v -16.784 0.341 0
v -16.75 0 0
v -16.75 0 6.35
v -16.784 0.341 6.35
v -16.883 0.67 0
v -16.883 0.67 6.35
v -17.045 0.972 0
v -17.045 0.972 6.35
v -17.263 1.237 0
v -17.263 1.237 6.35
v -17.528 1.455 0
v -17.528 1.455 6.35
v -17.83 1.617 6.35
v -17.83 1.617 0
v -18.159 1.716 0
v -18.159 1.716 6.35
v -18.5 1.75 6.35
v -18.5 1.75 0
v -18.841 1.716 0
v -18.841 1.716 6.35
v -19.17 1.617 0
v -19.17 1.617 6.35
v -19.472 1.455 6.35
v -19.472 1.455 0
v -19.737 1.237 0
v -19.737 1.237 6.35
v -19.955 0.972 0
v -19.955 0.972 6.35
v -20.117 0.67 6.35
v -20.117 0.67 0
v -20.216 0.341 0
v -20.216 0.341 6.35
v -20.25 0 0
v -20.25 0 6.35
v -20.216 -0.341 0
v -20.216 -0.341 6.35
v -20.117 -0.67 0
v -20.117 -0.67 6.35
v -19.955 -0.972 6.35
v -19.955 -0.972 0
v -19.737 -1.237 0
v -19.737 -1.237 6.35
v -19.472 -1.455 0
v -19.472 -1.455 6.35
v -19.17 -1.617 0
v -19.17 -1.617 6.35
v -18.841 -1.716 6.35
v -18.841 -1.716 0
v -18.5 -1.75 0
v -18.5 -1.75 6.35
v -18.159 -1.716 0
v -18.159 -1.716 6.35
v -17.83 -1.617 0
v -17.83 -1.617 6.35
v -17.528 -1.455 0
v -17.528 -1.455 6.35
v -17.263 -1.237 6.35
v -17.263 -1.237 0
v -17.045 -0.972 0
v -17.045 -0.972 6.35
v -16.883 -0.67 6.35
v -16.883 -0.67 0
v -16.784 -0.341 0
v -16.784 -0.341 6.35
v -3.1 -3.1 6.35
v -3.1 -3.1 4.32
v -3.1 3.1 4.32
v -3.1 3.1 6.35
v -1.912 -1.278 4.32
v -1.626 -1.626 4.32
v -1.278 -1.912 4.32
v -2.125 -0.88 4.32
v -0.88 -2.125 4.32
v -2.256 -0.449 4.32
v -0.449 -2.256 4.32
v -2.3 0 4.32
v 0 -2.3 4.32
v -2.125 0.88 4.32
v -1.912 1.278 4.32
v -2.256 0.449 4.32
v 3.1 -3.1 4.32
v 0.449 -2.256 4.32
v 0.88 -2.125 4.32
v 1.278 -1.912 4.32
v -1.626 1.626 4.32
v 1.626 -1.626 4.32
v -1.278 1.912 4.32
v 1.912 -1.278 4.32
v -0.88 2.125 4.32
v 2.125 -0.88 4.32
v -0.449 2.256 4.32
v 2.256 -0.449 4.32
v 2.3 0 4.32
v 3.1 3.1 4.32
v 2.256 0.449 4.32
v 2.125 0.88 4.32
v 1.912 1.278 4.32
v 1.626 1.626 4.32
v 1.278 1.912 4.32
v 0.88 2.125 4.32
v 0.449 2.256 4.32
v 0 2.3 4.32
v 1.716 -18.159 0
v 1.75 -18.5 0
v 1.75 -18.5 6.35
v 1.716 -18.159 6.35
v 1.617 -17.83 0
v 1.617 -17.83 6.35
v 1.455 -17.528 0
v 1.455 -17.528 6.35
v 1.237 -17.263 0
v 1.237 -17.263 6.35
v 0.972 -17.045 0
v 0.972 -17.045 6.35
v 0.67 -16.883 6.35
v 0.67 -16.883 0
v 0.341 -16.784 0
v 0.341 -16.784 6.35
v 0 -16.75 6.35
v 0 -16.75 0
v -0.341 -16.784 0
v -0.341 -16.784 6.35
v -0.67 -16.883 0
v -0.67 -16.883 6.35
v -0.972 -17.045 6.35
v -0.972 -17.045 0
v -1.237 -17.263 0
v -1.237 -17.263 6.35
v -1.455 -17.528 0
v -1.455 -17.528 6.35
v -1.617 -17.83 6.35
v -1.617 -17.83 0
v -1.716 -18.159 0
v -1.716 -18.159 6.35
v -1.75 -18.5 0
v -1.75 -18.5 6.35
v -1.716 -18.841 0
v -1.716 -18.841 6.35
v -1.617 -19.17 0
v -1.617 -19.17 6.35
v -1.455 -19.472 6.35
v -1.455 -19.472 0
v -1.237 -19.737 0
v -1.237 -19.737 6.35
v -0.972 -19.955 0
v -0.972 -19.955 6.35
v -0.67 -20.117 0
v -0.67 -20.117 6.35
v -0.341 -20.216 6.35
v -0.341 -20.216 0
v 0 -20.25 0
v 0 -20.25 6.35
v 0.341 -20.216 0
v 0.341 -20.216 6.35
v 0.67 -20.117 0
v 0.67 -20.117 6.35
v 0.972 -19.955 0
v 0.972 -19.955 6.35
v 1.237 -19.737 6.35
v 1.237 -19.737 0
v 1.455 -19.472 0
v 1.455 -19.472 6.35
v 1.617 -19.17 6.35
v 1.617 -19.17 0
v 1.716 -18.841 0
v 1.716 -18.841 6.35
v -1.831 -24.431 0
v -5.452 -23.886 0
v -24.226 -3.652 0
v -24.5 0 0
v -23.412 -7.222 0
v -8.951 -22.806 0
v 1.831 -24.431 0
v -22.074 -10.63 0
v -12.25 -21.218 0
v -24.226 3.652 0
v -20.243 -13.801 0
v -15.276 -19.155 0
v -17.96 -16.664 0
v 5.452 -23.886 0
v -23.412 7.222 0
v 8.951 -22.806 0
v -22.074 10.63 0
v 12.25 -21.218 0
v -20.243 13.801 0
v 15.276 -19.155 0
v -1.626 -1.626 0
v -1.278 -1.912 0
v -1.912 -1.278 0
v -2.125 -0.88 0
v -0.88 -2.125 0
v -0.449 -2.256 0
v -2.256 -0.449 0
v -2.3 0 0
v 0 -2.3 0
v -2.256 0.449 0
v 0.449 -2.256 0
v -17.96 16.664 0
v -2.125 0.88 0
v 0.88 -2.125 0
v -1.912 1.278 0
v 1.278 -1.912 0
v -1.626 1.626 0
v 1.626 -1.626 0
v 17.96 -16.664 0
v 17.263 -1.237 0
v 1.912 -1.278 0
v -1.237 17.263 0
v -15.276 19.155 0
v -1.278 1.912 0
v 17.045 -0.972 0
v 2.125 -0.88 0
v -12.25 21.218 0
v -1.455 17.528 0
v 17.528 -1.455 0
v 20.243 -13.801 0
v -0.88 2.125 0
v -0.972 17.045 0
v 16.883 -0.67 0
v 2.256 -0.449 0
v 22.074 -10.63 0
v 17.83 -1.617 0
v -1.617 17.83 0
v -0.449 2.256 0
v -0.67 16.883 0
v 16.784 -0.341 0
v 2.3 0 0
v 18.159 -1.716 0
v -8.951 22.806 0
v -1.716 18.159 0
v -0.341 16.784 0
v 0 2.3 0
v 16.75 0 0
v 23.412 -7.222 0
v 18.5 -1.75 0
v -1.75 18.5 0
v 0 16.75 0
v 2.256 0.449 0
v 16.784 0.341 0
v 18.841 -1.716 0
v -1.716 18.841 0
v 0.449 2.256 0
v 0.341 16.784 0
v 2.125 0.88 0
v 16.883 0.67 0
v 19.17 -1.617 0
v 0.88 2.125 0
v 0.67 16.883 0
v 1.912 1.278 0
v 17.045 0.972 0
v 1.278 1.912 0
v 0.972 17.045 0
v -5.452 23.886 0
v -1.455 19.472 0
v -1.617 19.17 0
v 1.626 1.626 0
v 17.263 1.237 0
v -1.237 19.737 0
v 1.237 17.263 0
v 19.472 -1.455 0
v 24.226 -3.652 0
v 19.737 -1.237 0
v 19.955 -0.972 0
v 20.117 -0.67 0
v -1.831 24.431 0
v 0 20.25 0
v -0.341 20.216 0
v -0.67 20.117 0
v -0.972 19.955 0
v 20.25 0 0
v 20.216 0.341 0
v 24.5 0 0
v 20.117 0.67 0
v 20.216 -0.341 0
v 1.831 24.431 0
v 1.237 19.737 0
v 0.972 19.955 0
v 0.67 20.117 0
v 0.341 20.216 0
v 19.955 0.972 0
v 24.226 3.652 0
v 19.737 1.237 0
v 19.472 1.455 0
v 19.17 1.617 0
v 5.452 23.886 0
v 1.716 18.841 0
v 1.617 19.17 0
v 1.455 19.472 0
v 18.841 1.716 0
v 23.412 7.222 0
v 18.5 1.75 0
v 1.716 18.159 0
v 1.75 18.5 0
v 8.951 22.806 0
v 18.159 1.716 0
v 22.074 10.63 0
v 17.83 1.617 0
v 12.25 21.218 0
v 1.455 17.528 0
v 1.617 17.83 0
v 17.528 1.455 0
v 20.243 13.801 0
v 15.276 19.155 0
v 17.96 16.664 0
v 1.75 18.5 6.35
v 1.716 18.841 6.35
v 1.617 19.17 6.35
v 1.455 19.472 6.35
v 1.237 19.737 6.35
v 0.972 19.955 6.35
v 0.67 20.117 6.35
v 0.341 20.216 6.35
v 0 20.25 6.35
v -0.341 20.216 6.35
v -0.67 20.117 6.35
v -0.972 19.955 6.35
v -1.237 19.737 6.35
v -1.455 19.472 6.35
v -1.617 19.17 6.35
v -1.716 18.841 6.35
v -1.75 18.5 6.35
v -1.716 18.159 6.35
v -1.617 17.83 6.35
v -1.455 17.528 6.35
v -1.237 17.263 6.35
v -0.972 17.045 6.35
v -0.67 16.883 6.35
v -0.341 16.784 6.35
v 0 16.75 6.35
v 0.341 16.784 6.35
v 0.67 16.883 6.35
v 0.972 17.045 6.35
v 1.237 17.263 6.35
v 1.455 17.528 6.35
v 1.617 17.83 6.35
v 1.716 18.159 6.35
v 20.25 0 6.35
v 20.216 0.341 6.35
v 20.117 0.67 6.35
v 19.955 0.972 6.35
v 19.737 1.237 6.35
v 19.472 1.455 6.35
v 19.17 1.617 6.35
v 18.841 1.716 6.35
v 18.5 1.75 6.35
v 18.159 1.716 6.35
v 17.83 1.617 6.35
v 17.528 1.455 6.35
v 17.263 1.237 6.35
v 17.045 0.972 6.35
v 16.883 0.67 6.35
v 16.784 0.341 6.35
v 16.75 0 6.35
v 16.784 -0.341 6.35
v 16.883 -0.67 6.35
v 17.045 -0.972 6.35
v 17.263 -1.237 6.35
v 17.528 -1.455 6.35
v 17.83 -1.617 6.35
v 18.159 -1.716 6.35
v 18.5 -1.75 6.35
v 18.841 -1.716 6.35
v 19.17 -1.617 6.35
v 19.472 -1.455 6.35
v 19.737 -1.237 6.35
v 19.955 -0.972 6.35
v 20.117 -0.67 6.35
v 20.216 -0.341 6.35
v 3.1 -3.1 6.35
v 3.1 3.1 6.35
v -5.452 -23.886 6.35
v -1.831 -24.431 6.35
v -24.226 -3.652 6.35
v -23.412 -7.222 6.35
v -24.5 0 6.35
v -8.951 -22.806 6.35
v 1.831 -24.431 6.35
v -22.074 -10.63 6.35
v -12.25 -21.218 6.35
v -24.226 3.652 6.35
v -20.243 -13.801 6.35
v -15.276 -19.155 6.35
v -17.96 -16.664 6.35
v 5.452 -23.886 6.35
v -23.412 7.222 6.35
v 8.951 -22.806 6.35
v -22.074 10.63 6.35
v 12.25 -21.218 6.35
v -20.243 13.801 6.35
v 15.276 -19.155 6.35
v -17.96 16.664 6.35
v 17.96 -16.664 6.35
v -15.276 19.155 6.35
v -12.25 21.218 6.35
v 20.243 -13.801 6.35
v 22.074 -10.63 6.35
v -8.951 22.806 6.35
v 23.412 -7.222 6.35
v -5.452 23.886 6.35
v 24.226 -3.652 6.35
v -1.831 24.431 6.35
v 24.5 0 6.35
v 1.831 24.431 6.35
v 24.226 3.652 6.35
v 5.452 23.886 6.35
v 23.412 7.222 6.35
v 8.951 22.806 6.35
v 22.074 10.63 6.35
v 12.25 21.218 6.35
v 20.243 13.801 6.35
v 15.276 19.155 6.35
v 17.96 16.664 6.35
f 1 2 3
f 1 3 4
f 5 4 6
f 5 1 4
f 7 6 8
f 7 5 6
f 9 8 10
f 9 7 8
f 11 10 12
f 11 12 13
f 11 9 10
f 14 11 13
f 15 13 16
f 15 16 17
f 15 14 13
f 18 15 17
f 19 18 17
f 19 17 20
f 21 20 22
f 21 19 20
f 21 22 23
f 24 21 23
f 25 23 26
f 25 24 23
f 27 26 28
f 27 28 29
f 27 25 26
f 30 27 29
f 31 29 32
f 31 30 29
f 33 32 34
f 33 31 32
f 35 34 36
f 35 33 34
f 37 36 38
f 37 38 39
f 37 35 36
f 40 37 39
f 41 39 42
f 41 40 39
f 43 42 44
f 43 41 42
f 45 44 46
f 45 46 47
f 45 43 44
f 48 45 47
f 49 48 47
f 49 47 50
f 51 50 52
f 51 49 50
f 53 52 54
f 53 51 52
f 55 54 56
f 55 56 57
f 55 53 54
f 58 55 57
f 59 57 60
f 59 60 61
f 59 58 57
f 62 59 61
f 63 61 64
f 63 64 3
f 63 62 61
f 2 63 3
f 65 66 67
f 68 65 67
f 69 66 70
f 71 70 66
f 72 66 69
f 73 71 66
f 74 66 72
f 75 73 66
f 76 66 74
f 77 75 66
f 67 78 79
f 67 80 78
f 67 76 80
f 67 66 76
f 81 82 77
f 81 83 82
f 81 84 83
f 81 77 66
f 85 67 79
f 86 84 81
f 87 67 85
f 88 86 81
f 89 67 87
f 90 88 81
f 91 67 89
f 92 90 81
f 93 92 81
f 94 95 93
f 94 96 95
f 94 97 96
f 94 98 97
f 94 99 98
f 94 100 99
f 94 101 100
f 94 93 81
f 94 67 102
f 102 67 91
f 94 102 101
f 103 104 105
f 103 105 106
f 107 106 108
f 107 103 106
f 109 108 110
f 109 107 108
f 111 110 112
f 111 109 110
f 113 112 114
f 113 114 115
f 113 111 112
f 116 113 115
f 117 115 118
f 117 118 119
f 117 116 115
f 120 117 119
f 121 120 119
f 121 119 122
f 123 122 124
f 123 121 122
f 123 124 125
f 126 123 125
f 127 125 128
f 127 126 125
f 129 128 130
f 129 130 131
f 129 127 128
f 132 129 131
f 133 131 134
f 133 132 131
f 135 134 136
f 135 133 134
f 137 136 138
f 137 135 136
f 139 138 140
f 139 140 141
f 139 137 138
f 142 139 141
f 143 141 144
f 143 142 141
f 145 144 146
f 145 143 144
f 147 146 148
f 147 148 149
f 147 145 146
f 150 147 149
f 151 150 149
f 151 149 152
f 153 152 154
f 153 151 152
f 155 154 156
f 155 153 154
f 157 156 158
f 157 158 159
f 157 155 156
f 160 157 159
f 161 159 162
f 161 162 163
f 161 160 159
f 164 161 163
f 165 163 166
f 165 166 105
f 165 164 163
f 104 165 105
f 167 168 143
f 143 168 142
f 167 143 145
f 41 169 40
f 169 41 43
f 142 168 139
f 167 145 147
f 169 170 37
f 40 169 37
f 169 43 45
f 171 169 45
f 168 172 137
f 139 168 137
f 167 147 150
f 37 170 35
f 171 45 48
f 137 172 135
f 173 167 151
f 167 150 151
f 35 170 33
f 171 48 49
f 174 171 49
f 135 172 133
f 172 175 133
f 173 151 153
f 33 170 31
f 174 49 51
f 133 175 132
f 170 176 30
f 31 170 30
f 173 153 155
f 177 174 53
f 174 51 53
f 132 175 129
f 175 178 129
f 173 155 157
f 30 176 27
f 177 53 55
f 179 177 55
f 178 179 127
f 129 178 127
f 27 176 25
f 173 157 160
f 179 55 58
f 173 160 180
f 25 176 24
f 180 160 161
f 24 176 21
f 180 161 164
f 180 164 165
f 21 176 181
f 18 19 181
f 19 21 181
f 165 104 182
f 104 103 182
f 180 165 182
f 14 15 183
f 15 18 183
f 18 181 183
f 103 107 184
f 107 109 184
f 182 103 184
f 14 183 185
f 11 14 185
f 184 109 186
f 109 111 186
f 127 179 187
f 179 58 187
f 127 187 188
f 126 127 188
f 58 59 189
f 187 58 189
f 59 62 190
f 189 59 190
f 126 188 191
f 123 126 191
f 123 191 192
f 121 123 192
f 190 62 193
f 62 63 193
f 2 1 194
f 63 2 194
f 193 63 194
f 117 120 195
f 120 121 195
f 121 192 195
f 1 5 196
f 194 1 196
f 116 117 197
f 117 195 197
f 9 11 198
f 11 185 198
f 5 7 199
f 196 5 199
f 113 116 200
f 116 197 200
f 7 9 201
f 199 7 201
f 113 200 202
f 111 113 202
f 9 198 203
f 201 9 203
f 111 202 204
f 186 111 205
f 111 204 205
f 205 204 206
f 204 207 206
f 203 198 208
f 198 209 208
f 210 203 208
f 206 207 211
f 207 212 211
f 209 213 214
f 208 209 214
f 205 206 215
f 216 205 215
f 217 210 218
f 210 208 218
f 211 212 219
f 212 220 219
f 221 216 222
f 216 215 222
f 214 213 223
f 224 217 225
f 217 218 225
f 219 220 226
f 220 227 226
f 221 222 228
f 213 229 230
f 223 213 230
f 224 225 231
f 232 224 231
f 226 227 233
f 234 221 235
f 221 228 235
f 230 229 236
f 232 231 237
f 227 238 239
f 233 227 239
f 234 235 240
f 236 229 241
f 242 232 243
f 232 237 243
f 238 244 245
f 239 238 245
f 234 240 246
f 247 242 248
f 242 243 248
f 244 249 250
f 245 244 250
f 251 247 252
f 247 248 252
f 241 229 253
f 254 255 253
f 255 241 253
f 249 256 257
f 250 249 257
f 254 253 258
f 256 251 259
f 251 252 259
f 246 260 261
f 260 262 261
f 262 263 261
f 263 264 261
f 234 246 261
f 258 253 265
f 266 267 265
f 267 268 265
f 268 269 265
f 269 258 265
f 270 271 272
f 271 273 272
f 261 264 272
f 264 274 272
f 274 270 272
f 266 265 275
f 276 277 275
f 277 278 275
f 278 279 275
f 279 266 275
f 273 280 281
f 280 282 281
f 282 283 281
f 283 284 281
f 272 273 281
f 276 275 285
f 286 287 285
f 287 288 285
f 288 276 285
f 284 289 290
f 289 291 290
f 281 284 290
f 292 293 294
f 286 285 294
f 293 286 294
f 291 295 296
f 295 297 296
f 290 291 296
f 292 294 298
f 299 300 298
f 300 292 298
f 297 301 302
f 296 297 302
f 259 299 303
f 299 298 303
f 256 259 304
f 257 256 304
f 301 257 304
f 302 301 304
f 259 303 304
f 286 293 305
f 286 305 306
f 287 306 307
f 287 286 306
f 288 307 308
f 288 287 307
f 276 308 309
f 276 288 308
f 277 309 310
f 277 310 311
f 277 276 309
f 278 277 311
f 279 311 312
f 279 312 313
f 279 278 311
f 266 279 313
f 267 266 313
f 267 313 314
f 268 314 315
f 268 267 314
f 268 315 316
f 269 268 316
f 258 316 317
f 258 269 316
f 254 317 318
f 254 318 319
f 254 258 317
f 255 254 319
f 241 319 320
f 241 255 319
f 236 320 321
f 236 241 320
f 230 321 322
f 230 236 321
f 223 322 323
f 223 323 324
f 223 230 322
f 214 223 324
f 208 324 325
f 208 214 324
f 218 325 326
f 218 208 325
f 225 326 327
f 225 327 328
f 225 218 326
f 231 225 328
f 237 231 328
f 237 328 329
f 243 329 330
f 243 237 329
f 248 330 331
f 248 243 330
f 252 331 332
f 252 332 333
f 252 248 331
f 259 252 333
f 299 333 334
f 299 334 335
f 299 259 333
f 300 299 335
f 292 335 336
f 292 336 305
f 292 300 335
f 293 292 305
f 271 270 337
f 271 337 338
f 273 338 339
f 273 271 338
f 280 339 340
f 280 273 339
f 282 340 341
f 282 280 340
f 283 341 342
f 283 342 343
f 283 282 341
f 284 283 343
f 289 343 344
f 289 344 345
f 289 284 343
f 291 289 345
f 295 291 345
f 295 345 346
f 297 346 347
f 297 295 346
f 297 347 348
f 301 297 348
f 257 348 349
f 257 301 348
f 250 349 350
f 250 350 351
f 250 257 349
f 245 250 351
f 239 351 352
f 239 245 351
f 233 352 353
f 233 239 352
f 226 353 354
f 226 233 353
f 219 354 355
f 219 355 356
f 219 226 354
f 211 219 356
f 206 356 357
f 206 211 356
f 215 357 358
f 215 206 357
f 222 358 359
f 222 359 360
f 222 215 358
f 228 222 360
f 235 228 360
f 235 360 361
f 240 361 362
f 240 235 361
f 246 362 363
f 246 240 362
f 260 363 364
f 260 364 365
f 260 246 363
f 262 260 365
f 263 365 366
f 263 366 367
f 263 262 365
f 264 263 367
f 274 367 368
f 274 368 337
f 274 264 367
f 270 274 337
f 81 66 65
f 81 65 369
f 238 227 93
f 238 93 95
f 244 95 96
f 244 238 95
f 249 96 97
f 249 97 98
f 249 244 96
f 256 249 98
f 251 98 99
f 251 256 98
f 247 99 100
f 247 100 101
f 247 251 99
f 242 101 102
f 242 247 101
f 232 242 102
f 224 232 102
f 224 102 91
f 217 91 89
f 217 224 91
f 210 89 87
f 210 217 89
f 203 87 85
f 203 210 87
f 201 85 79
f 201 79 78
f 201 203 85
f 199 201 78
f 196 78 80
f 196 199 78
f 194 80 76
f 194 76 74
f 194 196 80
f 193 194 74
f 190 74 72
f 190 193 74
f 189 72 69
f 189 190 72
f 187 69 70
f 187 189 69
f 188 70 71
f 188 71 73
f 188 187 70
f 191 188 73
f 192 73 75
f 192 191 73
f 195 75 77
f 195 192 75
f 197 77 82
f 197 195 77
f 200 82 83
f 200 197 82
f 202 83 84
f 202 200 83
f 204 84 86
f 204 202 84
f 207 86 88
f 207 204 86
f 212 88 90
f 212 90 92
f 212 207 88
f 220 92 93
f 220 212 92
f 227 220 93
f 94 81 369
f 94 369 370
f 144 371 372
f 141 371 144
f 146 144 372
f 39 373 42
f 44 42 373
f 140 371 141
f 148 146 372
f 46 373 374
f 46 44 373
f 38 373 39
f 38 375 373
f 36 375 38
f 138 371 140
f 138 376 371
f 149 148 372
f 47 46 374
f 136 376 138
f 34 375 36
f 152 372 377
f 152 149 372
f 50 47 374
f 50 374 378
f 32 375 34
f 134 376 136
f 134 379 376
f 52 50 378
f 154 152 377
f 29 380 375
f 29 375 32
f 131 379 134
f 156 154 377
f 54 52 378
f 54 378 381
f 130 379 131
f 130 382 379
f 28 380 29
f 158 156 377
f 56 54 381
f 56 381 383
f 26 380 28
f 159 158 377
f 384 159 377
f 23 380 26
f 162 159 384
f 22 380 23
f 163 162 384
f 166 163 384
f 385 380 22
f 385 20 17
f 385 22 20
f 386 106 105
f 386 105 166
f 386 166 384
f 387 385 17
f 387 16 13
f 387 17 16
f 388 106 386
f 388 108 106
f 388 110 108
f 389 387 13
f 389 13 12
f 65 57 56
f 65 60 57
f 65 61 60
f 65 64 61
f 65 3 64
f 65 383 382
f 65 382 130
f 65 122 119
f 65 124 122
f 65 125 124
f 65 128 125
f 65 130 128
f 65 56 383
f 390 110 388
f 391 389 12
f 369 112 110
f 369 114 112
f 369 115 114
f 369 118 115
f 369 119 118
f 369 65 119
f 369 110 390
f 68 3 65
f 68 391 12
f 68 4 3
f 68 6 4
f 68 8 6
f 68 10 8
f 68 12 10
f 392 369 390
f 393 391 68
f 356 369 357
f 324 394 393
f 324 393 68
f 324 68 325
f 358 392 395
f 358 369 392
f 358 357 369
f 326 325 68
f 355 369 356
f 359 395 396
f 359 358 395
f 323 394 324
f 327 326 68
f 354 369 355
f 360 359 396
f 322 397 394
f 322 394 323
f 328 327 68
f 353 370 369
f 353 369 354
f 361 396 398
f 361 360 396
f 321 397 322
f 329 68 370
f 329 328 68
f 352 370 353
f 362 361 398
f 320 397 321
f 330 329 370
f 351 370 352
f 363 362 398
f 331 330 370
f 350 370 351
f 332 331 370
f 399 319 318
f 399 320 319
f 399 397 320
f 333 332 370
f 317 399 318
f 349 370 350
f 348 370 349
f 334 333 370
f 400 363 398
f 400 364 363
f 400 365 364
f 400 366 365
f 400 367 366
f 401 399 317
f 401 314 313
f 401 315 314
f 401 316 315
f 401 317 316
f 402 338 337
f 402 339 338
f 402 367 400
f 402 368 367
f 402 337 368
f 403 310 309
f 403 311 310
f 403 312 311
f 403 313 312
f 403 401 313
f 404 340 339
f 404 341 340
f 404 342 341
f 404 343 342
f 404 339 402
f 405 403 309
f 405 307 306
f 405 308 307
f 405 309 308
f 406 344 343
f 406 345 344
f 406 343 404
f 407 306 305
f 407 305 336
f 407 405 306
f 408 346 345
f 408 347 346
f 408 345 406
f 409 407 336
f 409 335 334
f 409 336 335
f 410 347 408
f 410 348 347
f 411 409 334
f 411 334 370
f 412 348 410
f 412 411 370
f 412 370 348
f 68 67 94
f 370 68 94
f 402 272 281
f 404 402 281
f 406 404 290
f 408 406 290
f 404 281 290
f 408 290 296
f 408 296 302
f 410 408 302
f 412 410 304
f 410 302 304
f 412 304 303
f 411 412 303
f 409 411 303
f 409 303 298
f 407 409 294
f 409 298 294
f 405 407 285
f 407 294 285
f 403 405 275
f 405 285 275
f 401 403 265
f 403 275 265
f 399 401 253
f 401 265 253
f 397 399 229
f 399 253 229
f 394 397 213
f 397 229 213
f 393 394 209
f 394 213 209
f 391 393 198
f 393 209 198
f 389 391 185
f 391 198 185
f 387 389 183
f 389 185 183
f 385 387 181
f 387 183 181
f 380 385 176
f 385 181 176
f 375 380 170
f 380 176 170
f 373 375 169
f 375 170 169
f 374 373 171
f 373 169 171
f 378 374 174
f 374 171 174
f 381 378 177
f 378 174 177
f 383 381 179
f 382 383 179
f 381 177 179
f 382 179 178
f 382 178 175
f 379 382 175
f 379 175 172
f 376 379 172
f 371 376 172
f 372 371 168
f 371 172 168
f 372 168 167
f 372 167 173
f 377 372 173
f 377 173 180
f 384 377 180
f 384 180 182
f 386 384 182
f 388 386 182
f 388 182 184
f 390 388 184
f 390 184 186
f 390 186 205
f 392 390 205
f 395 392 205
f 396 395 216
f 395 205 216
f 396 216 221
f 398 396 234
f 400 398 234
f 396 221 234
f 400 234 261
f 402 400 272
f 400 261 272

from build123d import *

# Parameters (mm, degrees)
F0_R     = 24.5
F0_R_2   = 1.75
F0_W     = 6.2
F0_H     = 6.2
F1_DEPTH = 6.35
F0_R_3   = 2.3
F2_DEPTH = 4.32


with BuildPart() as f1:
    # F0 (on Top) → F1 (new body)
    with BuildSketch(Plane.XY):
        Circle(F0_R)
        with Locations((0, -18.5)):
            Circle(F0_R_2, mode=Mode.SUBTRACT)
        with Locations((-18.5, 0)):
            Circle(F0_R_2, mode=Mode.SUBTRACT)
        Rectangle(F0_W, F0_H, mode=Mode.SUBTRACT)
        with Locations((18.5, 0)):
            Circle(F0_R_2, mode=Mode.SUBTRACT)
        with Locations((0, 18.5)):
            Circle(F0_R_2, mode=Mode.SUBTRACT)
    extrude(amount=F1_DEPTH)

    # F0 (on Top) → F2 (join)
    with BuildSketch(Plane.XY):
        Rectangle(F0_W, F0_H)
        Circle(F0_R_3, mode=Mode.SUBTRACT)
    extrude(amount=F2_DEPTH)


solid = f1.part
